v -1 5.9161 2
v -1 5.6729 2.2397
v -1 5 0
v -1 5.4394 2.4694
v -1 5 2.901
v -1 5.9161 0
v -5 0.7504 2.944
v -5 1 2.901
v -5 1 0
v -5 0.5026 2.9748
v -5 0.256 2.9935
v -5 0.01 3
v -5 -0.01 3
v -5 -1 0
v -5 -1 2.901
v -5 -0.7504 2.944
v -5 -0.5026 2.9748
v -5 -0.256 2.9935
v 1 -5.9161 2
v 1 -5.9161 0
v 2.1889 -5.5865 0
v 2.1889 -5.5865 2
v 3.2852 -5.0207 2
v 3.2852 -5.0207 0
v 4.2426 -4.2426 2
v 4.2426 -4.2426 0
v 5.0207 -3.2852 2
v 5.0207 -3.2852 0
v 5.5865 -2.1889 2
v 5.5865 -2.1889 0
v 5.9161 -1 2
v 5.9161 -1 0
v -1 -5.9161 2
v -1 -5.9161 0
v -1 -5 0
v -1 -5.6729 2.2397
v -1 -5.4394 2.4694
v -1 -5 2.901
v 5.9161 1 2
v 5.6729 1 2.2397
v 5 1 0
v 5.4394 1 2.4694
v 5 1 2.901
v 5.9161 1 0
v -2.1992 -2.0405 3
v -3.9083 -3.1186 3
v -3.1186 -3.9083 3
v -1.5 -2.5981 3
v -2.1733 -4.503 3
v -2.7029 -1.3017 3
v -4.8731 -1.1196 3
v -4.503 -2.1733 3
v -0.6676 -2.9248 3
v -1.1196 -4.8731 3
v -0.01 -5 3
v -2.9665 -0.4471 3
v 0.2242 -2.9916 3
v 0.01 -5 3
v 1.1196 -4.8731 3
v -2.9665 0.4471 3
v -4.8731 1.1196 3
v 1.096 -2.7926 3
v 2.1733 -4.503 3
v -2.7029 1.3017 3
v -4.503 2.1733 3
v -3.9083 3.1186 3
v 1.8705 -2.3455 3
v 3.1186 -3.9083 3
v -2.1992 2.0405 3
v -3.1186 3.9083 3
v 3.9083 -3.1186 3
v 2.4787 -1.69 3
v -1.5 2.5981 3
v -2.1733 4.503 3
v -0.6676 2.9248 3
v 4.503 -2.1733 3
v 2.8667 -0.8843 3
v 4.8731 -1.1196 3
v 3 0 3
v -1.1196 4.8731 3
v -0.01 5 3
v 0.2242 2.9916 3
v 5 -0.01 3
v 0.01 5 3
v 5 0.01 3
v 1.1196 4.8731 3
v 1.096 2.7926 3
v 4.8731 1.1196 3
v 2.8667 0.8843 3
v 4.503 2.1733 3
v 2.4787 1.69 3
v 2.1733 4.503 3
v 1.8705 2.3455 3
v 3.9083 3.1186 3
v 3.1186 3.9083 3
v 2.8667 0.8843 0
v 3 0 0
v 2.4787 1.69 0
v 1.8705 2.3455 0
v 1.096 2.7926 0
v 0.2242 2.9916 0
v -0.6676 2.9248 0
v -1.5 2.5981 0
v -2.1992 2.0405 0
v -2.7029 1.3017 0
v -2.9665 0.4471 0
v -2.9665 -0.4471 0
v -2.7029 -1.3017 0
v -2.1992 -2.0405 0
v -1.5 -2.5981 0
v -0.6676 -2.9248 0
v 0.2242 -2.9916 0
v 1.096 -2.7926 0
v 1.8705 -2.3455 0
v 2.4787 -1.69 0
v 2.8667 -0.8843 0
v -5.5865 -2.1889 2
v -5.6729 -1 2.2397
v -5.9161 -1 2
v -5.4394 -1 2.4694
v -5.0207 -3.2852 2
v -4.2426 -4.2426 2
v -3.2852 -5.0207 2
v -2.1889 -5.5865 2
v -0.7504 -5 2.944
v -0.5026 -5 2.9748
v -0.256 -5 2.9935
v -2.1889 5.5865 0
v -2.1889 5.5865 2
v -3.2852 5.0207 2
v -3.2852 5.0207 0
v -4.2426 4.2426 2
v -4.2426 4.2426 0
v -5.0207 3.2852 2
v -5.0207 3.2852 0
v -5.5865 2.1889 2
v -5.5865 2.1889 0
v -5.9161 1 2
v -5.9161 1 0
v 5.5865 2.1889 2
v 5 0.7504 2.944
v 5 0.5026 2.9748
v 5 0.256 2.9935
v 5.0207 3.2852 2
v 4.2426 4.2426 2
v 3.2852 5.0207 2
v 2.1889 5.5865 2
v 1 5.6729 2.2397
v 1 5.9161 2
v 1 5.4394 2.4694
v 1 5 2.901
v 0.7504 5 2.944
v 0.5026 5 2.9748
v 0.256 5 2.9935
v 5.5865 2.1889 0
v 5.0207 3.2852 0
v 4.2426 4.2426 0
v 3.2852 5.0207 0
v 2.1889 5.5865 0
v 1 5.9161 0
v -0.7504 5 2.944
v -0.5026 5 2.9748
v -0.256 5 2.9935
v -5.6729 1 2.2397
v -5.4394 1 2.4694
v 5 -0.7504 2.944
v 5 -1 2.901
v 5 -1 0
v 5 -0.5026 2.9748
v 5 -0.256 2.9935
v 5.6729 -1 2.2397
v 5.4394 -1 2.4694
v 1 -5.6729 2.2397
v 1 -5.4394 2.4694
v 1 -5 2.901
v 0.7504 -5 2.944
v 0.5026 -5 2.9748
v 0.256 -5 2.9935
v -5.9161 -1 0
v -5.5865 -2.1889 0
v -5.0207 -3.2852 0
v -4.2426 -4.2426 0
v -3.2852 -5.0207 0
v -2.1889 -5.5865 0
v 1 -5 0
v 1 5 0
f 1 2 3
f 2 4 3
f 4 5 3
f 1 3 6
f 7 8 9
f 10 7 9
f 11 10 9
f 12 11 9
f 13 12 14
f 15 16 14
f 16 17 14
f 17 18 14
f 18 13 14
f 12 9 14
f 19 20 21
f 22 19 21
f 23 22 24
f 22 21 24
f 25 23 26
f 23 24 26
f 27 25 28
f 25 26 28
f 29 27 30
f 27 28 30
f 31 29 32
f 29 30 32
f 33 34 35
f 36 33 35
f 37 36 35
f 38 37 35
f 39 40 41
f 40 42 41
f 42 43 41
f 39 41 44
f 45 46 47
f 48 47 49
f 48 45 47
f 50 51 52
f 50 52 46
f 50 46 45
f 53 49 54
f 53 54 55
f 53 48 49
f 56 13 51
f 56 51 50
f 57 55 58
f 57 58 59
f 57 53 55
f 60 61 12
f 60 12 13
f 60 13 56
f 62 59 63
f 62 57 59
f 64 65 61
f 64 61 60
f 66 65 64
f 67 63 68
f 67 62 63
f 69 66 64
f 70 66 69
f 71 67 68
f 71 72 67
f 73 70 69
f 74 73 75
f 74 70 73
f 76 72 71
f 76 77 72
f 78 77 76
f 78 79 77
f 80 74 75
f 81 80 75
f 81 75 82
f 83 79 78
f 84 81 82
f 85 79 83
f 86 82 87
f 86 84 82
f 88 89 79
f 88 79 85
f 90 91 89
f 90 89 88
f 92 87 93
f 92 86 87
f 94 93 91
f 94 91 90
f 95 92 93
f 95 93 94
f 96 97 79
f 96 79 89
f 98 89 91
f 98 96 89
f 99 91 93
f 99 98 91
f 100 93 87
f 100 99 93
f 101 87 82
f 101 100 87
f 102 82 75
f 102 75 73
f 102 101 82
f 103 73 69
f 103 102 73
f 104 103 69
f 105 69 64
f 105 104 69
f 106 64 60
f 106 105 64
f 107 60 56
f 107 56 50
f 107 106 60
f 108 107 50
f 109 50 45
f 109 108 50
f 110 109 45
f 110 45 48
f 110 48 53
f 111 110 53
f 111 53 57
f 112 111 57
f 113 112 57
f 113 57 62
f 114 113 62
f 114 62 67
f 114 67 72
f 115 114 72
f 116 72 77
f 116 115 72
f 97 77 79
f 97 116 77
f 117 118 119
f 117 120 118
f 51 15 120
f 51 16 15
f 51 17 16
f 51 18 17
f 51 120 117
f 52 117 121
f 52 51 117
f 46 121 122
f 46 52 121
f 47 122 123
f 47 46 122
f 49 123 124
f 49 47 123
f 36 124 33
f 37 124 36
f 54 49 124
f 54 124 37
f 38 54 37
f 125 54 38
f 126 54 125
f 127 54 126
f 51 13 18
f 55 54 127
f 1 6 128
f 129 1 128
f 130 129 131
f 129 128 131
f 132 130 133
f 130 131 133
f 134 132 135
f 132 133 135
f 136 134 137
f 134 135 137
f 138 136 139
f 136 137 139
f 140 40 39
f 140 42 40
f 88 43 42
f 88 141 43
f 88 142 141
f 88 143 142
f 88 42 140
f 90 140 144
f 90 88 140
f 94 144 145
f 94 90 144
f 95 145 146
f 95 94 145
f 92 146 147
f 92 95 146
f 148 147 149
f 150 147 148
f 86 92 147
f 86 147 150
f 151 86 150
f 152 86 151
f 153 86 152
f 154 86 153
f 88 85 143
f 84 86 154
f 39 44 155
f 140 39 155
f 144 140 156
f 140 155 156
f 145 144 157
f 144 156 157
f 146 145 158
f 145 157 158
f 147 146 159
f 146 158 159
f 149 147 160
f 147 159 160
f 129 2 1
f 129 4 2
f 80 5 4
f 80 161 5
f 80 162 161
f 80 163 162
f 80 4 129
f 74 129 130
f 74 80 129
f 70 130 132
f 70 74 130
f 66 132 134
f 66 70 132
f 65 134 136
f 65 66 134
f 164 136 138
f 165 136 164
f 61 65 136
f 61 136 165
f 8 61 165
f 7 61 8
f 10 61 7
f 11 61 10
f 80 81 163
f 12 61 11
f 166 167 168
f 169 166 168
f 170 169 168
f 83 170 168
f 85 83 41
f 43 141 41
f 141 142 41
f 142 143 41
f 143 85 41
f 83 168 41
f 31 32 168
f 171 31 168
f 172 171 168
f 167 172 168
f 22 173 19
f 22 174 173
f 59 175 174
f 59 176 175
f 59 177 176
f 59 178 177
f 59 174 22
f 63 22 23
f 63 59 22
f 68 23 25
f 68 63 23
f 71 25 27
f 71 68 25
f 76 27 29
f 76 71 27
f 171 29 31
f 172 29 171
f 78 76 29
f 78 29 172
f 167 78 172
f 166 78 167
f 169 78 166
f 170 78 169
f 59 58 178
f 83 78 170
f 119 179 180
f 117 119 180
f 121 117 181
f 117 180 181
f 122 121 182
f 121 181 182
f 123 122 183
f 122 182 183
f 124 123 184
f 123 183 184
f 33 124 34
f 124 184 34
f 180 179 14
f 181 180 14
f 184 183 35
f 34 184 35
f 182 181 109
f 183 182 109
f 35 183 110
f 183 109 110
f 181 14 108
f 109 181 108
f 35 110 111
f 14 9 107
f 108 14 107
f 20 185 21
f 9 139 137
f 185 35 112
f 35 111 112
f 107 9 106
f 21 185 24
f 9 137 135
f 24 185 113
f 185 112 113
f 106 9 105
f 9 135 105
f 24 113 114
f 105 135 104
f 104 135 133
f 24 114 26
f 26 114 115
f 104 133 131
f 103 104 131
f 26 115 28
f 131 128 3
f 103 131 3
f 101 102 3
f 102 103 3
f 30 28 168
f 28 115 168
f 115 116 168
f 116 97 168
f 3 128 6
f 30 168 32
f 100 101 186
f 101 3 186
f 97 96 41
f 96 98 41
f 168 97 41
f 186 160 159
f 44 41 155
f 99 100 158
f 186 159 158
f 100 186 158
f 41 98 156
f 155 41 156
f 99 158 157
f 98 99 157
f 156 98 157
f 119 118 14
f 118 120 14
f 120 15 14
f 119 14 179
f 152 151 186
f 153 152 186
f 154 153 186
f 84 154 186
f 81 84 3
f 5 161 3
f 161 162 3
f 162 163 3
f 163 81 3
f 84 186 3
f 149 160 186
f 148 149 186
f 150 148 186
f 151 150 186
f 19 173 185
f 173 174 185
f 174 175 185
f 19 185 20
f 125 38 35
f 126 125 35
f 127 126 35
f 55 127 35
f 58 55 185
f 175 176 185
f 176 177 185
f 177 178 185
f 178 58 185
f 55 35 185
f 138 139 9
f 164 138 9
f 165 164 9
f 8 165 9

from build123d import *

# Parameters (mm, degrees)
F0_R     = 3
F1_DEPTH = 3
F2_SIZE  = 0.99999


# Not quite as in the source:
# - a fillet or chamfer is up to 0.001 mm smaller than in the source, because OpenCascade refuses the exact size


with BuildPart() as f1:
    # F0 (on Top) → F1 (new body)
    with BuildSketch(Plane.XY):
        with BuildLine():
            Line((-1, 5), (-1, 5.9160797831))
            ThreePointArc((-1, 5.9160797831), (-4.2426406871, 4.2426406871), (-5.9160797831, 1))
            Line((-5.9160797831, 1), (-5, 1))
            Line((-5, 1), (-5, -1))
            Line((-5, -1), (-5.9160797831, -1))
            ThreePointArc((-5.9160797831, -1), (-4.2426406871, -4.2426406871), (-1, -5.9160797831))
            Line((-1, -5.9160797831), (-1, -5))
            Line((-1, -5), (1, -5))
            Line((1, -5), (1, -5.9160797831))
            ThreePointArc((1, -5.9160797831), (4.2426406871, -4.2426406871), (5.9160797831, -1))
            Line((5.9160797831, -1), (5, -1))
            Line((5, -1), (5, 1))
            Line((5, 1), (5.9160797831, 1))
            ThreePointArc((5.9160797831, 1), (4.2426406871, 4.2426406871), (1, 5.9160797831))
            Line((1, 5.9160797831), (1, 5))
            Line((1, 5), (-1, 5))
        make_face()
        Circle(F0_R, mode=Mode.SUBTRACT)
    extrude(amount=F1_DEPTH)

    # F2 (size 1 in the source; OpenCascade refuses exactly that, so slightly less here)
    f2_edges = [f1.edges().sort_by_distance(p)[0] for p in [
        (-4.242641, -4.242641, 3),
        (-4.242641, 4.242641, 3),
        (4.242641, 4.242641, 3),
        (4.242641, -4.242641, 3),
    ]]
    chamfer(f2_edges, length=F2_SIZE)


solid = f1.part
